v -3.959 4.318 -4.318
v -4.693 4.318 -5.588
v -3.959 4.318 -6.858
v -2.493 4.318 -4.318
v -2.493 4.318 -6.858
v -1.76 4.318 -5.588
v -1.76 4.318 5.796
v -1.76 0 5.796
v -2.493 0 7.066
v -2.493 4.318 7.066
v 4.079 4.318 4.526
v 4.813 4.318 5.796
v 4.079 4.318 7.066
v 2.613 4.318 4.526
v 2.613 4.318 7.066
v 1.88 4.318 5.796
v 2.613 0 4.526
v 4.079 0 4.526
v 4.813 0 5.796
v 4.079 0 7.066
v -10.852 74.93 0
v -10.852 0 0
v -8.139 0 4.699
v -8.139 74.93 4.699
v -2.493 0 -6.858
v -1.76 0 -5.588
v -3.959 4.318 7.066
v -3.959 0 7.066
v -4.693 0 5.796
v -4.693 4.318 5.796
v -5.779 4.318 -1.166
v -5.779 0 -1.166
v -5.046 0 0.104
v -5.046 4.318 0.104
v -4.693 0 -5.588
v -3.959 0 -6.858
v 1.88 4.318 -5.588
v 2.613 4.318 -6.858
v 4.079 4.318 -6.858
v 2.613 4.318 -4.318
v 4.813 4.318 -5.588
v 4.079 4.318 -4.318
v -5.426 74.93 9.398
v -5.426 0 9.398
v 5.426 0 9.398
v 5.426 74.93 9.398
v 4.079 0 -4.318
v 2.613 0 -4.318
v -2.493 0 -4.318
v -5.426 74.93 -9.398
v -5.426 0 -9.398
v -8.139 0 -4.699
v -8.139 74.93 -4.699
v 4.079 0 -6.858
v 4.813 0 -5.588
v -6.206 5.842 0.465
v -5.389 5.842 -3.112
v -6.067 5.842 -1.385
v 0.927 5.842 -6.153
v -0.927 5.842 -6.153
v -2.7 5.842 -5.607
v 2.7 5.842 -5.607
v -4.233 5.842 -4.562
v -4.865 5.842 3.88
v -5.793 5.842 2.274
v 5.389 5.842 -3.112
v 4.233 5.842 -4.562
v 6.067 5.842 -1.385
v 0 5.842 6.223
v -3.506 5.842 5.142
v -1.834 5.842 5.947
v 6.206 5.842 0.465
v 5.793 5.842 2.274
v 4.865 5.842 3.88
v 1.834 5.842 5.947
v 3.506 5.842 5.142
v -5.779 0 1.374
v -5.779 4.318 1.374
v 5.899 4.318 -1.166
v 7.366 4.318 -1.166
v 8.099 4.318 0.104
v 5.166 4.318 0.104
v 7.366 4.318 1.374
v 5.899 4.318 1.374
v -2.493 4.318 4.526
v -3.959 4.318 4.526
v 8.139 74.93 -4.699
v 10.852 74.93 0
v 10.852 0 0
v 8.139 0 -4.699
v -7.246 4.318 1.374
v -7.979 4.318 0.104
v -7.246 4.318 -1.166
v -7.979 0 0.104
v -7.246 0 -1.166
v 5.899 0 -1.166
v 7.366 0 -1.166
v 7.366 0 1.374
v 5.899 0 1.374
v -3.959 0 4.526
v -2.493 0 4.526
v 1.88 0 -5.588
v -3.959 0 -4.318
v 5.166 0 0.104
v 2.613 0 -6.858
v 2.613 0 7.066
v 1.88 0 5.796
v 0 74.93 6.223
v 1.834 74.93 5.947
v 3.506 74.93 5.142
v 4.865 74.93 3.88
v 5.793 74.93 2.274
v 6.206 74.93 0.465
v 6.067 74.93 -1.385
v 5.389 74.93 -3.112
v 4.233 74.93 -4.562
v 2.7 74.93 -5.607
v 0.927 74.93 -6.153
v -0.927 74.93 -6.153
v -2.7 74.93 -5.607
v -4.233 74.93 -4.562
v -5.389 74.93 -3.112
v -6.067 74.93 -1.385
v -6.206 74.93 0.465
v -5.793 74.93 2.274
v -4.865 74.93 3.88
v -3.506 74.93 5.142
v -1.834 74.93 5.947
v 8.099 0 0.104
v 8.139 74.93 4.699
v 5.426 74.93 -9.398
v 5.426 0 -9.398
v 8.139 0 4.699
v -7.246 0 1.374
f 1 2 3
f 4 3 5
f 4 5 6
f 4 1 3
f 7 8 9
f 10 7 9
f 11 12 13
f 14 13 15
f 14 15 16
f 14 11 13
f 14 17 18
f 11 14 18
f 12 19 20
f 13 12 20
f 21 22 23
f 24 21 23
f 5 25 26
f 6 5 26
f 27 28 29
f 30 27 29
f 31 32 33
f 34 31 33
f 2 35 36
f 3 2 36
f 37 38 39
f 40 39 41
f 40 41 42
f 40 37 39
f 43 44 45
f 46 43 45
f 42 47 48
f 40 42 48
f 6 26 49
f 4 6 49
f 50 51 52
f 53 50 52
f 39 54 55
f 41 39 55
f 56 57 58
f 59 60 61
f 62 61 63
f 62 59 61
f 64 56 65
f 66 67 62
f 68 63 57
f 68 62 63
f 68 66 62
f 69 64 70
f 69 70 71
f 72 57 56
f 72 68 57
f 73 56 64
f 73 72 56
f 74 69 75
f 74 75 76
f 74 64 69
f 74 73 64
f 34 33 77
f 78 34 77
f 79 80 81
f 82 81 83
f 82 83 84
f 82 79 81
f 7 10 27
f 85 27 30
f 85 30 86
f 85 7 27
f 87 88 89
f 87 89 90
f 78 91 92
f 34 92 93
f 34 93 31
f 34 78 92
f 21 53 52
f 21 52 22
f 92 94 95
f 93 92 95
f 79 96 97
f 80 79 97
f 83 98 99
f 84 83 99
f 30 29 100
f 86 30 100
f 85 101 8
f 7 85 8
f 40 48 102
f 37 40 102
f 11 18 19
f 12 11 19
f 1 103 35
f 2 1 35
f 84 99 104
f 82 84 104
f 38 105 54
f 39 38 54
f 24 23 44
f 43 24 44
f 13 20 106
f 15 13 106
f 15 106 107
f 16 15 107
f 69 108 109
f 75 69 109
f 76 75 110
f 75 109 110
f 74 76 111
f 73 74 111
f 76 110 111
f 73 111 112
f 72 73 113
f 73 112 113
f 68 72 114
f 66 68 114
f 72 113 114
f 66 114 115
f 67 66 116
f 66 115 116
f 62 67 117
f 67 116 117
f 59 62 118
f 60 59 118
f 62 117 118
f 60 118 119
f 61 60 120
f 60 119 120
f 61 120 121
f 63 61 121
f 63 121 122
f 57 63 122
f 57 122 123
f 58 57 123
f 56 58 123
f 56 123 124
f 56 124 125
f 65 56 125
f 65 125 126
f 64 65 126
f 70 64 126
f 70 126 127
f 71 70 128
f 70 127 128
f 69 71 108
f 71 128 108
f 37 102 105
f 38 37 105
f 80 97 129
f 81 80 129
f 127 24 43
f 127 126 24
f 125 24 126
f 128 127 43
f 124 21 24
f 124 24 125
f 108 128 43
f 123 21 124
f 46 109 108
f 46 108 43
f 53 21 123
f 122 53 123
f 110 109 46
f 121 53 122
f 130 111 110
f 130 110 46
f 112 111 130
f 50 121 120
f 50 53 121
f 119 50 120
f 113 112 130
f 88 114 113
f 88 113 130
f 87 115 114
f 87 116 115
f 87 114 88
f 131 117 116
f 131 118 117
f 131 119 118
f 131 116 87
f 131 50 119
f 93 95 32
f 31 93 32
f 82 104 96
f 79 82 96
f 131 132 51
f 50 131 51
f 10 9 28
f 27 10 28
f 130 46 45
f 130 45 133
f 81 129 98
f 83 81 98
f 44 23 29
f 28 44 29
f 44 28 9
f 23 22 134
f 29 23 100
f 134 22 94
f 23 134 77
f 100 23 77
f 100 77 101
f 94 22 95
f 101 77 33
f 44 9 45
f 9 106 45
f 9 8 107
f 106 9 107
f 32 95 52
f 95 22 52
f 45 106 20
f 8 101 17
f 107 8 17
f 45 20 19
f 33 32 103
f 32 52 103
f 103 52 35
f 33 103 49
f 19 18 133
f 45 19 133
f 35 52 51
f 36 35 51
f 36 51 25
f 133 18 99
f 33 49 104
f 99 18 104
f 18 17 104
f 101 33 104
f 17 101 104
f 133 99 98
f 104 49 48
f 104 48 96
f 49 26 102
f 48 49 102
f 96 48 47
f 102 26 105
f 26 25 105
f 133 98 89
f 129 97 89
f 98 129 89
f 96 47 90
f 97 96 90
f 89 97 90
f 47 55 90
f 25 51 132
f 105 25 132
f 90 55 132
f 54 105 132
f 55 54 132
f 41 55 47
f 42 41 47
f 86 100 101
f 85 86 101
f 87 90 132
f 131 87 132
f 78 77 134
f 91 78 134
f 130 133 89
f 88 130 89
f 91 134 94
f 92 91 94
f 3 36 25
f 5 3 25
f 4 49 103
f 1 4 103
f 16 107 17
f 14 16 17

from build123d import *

# Parameters (mm, degrees)
SKETCH1_R           = 9.398
BOSS_EXTRUDE1_DEPTH = 74.93
SKETCH2_R           = 6.223
CUT_EXTRUDE1_DEPTH  = 69.088
BOSS_EXTRUDE2_START = -74.93
BOSS_EXTRUDE2_DEPTH = 74.93
CUT_EXTRUDE6_DEPTH  = 4.318
CIRPATTERN2_COUNT   = 6


with BuildPart() as part:
    # Sketch1 → Boss-Extrude1 (new body)
    with BuildSketch(Plane(origin=(0, 0, 0), x_dir=(1, 0, 0), z_dir=(0, 1, 0))):
        with Locations(Location((0, 0, 0), (0, 0, 270))):
            Circle(SKETCH1_R)
    extrude(amount=BOSS_EXTRUDE1_DEPTH)

    # Sketch2 → Cut-Extrude1 (cut)
    with BuildSketch(Plane(origin=(0, 74.93, 0), x_dir=(1, 0, 0), z_dir=(0, 1, 0))):
        with Locations(Location((0, 0, 0), (0, 0, 270))):
            Circle(SKETCH2_R)
    extrude(amount=-CUT_EXTRUDE1_DEPTH, mode=Mode.SUBTRACT)

    # Sketch7 → Boss-Extrude2 (add)
    with BuildSketch(Plane(origin=(0, 74.93, 0), x_dir=(1, 0, 0), z_dir=(0, 1, 0)).offset(BOSS_EXTRUDE2_START)):
        with BuildLine():
            ThreePointArc((-8.138906715, 4.699000052), (-4.698999978, 8.138906757), (-9e-09, 9.398))
            Line((-9e-09, 9.398), (-5.42593783, 9.398))
            Line((-5.42593783, 9.398), (-8.138906715, 4.699000052))
        make_face()
        with BuildLine():
            ThreePointArc((-9e-09, 9.398), (4.69899997, 8.138906762), (8.138906715, 4.699000052))
            Line((8.138906715, 4.699000052), (5.42593783, 9.398))
            Line((5.42593783, 9.398), (-9e-09, 9.398))
        make_face()
        with BuildLine():
            Line((8.138906731, -4.699000024), (10.85187566, 0))
            Line((10.85187566, 0), (8.138906715, 4.699000052))
            ThreePointArc((8.138906715, 4.699000052), (9.077770908, 2.432381415), (9.398, 0))
            ThreePointArc((9.398, 0), (9.077770912, -2.432381399), (8.138906731, -4.699000024))
        make_face()
        with BuildLine():
            Line((5.42593783, -9.398), (8.138906731, -4.699000024))
            ThreePointArc((8.138906731, -4.699000024), (4.698999988, -8.138906752), (0, -9.398))
            Line((0, -9.398), (5.42593783, -9.398))
        make_face()
        with BuildLine():
            Line((-5.42593783, -9.398), (0, -9.398))
            ThreePointArc((0, -9.398), (-4.699000032, -8.138906726), (-8.138906781, -4.698999937))
            Line((-8.138906781, -4.698999937), (-5.42593783, -9.398))
        make_face()
        with BuildLine():
            ThreePointArc((-8.138906781, -4.698999937), (-9.398, 6.6e-08), (-8.138906715, 4.699000052))
            Line((-8.138906715, 4.699000052), (-10.85187566, 0))
            Line((-10.85187566, 0), (-8.138906781, -4.698999937))
        make_face()
    extrude(amount=BOSS_EXTRUDE2_DEPTH)

    # Sketch8 → Cut-Extrude6 (cut)
    with BuildSketch(Plane.XZ):
        Polygon((-1.75976362, -5.588), (-2.492998462, -4.318), (-3.959468146, -4.318), (-4.692702988, -5.588), (-3.959468146, -6.858), (-2.492998462, -6.858), align=None)
    cut_extrude6 = extrude(amount=-CUT_EXTRUDE6_DEPTH, mode=Mode.SUBTRACT)

    # CirPattern2: Cut-Extrude6 ×6 about axis
    cirpattern2_axis = Axis((0.06001178, 0, 0.103943452), (0, 1, 0))
    for i in range(1, CIRPATTERN2_COUNT):
        add(cut_extrude6.rotate(cirpattern2_axis, i * 360 / CIRPATTERN2_COUNT), mode=Mode.SUBTRACT)


solid = part.part
